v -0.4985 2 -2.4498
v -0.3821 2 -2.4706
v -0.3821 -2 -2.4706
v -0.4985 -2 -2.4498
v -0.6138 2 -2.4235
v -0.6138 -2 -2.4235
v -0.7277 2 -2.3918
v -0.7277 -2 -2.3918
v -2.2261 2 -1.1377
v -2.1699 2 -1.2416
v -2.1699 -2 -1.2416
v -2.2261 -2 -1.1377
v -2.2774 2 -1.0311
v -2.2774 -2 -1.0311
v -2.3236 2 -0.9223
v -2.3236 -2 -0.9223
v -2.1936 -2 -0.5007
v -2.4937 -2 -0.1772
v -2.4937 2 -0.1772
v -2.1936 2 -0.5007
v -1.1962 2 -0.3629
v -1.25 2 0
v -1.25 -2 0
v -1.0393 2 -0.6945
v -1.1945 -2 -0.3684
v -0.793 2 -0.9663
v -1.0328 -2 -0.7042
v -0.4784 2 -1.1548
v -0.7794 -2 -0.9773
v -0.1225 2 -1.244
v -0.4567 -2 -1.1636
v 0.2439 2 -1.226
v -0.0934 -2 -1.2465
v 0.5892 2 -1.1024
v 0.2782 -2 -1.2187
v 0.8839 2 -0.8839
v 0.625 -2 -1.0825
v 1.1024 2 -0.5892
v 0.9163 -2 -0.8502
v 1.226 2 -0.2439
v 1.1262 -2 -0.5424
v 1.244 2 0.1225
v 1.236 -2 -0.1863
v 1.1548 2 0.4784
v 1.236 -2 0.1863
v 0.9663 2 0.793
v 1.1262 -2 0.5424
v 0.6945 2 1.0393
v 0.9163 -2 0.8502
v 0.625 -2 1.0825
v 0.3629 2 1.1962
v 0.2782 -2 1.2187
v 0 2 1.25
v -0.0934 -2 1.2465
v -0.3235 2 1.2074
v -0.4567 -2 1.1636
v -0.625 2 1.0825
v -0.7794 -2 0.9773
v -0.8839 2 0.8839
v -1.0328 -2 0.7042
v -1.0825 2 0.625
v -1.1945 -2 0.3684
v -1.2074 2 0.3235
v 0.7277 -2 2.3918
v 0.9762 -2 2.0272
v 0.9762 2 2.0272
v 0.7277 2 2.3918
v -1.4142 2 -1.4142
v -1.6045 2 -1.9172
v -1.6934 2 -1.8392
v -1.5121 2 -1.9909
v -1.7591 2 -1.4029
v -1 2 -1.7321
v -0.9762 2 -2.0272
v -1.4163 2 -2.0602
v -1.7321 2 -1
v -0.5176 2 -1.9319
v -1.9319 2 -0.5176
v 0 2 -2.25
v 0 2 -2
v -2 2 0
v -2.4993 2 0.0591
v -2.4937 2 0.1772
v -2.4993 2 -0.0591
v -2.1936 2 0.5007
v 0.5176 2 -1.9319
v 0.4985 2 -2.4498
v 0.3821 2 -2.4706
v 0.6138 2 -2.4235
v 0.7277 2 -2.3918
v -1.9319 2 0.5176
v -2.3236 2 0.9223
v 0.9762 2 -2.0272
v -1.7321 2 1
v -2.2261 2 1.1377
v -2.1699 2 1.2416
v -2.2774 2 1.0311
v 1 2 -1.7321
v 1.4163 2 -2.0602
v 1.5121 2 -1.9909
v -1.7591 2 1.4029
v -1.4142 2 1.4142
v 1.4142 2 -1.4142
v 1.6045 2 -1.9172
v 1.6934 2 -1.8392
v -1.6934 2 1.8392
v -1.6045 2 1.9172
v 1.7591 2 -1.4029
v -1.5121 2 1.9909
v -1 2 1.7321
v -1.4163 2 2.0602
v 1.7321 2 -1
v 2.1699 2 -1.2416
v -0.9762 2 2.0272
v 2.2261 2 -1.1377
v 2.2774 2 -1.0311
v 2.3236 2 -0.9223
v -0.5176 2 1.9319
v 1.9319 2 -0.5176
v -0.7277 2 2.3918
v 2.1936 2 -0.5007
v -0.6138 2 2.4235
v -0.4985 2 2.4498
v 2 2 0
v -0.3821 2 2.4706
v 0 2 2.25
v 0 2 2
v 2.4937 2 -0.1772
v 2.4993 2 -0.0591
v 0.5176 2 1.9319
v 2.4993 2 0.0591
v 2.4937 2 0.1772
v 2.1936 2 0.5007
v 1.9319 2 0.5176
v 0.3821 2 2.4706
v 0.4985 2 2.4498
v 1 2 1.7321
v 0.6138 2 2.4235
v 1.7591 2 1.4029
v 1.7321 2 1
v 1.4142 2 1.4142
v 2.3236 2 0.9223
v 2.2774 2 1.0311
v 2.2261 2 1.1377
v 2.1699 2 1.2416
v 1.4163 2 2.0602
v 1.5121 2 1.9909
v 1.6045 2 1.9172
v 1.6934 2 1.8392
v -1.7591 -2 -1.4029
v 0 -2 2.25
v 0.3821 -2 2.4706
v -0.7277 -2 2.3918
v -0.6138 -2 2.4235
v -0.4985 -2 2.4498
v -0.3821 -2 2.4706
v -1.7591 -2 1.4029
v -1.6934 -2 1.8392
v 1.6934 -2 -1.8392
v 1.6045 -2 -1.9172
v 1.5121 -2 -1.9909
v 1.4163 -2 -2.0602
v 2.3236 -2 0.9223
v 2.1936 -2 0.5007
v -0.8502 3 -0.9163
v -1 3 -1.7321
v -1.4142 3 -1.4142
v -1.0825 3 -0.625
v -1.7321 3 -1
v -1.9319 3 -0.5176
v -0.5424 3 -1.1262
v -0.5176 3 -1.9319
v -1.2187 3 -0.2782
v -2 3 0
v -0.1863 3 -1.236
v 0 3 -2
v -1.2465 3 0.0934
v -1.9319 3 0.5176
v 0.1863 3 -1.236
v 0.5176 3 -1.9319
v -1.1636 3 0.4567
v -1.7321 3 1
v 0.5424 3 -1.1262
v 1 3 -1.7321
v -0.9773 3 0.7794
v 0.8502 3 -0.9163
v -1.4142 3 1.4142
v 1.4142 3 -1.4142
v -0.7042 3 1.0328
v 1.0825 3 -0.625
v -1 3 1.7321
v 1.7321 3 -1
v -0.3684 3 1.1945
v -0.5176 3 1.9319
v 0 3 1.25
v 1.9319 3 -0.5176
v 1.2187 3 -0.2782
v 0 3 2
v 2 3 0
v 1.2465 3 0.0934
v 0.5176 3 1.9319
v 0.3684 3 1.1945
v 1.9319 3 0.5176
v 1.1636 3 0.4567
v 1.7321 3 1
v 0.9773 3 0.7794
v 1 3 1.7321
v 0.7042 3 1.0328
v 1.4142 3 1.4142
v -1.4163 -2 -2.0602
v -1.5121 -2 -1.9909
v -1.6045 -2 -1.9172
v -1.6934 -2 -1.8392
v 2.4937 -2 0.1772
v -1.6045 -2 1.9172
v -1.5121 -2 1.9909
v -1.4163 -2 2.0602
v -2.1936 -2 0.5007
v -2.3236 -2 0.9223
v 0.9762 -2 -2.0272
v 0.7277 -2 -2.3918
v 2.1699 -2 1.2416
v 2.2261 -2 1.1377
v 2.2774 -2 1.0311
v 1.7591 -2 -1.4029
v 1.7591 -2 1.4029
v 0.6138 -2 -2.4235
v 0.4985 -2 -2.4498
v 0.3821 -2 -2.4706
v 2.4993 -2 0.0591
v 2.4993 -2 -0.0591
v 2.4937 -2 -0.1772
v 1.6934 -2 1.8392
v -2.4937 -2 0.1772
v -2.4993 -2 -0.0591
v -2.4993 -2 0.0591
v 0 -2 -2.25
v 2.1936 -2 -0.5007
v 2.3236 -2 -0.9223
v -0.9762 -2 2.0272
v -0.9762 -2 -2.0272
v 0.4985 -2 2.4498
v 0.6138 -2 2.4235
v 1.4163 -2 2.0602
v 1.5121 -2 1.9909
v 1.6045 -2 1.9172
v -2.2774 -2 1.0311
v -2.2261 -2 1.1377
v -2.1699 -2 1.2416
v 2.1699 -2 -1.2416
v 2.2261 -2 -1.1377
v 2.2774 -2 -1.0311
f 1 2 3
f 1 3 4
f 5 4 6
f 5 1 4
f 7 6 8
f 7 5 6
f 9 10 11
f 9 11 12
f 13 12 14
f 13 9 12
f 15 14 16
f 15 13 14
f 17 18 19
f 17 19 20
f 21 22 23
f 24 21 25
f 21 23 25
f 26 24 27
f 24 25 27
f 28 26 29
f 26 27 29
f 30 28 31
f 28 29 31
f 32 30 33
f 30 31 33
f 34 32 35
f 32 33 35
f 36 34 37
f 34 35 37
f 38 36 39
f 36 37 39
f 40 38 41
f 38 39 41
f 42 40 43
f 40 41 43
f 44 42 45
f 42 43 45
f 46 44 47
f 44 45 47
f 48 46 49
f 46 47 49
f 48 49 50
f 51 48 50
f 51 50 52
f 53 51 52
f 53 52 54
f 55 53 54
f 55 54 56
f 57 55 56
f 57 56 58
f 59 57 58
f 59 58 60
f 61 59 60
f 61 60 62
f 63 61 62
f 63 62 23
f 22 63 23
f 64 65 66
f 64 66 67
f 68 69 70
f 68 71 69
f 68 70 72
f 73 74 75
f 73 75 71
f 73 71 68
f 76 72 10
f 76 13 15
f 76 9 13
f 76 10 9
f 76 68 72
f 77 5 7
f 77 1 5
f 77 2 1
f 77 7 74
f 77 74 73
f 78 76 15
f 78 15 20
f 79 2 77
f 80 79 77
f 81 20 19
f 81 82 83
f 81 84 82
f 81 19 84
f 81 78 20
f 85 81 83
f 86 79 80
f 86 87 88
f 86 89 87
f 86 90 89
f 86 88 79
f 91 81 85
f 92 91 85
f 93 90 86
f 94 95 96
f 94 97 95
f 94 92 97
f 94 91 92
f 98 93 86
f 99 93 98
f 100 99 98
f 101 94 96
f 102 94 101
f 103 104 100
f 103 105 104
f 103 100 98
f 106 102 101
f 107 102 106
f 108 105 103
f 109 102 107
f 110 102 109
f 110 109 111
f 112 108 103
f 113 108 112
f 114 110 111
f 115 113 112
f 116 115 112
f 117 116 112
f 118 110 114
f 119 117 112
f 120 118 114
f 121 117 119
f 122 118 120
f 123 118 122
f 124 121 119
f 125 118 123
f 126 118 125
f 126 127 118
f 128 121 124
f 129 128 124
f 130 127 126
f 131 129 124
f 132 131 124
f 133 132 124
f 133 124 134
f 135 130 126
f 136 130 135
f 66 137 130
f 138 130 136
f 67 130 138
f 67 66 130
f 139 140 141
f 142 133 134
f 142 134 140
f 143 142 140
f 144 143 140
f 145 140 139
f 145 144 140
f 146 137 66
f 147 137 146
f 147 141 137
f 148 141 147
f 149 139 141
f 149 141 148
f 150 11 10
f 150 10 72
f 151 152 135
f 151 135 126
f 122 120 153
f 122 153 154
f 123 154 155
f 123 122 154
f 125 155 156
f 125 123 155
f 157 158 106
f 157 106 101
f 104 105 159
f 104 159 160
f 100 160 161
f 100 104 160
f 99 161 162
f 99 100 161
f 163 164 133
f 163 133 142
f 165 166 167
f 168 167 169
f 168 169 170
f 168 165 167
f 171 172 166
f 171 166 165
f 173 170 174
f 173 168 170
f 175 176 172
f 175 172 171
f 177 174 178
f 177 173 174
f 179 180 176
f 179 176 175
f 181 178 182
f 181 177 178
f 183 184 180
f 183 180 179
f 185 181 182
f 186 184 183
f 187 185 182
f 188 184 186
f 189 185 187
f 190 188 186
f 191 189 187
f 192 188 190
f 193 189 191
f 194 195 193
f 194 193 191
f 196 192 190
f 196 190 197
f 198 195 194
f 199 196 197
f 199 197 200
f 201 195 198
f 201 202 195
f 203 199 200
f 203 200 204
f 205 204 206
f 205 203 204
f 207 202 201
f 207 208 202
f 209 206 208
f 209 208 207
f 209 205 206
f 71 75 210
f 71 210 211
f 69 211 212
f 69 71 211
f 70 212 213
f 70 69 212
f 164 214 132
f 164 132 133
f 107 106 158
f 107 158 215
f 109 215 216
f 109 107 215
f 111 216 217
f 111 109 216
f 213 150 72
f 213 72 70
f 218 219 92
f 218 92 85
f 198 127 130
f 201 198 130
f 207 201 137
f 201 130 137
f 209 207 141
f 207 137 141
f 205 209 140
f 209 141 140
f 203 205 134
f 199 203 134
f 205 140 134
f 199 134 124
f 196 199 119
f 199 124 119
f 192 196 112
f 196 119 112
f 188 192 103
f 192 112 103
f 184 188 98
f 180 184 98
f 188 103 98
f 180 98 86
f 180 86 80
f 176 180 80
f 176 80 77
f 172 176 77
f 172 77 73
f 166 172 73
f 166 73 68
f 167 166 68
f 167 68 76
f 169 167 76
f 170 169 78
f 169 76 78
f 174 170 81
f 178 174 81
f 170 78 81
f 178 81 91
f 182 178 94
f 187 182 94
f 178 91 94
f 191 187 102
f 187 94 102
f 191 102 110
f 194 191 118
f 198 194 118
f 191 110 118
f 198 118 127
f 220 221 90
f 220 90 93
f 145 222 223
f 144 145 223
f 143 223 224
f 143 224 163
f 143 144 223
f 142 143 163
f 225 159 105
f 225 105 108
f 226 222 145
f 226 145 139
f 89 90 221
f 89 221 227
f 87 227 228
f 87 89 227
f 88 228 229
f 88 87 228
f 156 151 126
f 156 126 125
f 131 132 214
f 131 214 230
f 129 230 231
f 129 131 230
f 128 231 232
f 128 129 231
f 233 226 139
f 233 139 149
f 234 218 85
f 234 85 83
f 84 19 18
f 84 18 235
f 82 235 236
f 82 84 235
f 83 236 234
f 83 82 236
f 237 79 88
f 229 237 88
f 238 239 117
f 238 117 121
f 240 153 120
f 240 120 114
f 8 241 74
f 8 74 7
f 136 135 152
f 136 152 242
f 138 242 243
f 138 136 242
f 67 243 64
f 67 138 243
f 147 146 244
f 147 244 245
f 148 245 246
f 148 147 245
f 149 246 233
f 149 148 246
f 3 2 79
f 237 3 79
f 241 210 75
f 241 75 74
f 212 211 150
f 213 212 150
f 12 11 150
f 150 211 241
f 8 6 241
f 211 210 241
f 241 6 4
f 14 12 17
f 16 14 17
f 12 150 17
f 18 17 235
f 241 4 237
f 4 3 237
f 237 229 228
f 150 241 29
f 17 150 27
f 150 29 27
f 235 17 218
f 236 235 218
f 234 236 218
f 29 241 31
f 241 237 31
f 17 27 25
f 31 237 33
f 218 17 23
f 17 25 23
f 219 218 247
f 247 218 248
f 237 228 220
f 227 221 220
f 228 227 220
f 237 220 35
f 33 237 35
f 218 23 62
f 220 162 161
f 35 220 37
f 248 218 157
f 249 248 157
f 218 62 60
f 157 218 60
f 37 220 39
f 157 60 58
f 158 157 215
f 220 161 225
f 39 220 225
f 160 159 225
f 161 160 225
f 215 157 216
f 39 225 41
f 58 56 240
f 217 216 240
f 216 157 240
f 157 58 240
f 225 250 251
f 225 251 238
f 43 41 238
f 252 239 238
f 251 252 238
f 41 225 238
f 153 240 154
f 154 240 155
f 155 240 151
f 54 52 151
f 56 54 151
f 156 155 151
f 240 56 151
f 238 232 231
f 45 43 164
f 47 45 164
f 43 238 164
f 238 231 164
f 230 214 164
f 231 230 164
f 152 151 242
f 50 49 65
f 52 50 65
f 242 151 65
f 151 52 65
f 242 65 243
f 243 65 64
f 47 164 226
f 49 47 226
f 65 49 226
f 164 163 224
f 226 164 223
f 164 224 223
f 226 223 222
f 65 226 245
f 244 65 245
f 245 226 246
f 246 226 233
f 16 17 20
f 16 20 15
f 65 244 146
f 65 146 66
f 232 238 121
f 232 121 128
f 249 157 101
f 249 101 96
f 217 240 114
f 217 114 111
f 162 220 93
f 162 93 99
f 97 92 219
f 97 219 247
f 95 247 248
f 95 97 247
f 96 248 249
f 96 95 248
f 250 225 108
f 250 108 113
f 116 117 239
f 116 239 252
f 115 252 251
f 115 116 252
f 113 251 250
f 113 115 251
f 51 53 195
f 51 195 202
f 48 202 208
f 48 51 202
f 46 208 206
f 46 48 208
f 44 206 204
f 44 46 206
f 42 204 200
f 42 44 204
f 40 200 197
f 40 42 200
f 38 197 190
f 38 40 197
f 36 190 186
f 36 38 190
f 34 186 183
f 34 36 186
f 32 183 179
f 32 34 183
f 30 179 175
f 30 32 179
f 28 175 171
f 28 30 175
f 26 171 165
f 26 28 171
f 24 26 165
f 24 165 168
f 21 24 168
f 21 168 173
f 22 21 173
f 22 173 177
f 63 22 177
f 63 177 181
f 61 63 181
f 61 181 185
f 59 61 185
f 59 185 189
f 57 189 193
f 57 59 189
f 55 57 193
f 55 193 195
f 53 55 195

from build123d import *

# Parameters (mm, degrees)
MAINBODYS_R           = 2.5
MAIN_BODY_DEPTH       = 2
M3X0_5_TAPPED_HOLE1_D = 2.5
GROOVED_CUT_DEPTH     = 6.338539126
GC_START              = -2
GC_CP_DEPTH           = 4
PRESSFITBODYS_R       = 2
PRESSFITBODYS_R_2     = 1.25
PRESS_FIT_BODY_DEPTH  = 1


# Read off the part's stored shape, not the designer's step: GC CP
with BuildPart() as part:
    # MainBodyS → MAIN BODY (new, symmetric)
    with BuildSketch(Plane(origin=(0, 0, 0), x_dir=(1, 0, 0), z_dir=(0, 1, 0))):
        with Locations(Location((0, 0, 0), (0, 0, 270))):
            Circle(MAINBODYS_R)
    extrude(amount=MAIN_BODY_DEPTH, both=True)

    # M3x0.5 Tapped Hole1 (through all)
    with Locations(Plane(origin=(0, 2, 0), x_dir=(1, 0, 0), z_dir=(0, 1, 0))):
        with Locations((0, 0)):
            Hole(M3X0_5_TAPPED_HOLE1_D / 2)

    # GroovedCutS → GROOVED CUT (cut, through all)
    with BuildSketch(Plane(origin=(0, 2, 0), x_dir=(1, 0, 0), z_dir=(0, 1, 0))):
        with BuildLine():
            Line((0, 2.25), (0.382129822, 2.470622755))
            ThreePointArc((0.382129822, 2.470622755), (0, 2.5), (-0.382129822, 2.470622755))
            Line((-0.382129822, 2.470622755), (0, 2.25))
        make_face()
    extrude(amount=-GROOVED_CUT_DEPTH, mode=Mode.SUBTRACT)

    # GC CP outline → GC CP (cut)
    with BuildSketch(Plane(origin=(0, 0, 0), x_dir=(1, 0, 0), z_dir=(0, 1, 0)).offset(GC_START)):
        with BuildLine():
            ThreePointArc((-0.727675966, 2.391754103), (-1.084709348, 2.25242217), (-1.416250112, 2.060154271))
            Line((-1.416250112, 2.060154271), (-0.976238413, 2.027179953))
            Line((-0.976238413, 2.027179953), (-0.727675966, 2.391754103))
        make_face()
        with BuildLine():
            Line((0.976238413, 2.027179953), (1.416250112, 2.060154271))
            ThreePointArc((1.416250112, 2.060154271), (1.084709348, 2.25242217), (0.727675966, 2.391754103))
            Line((0.727675966, 2.391754103), (0.976238413, 2.027179953))
        make_face()
        with BuildLine():
            Line((1.759120836, 1.402852054), (2.169864698, 1.241646967))
            ThreePointArc((2.169864698, 1.241646967), (1.954578706, 1.558724504), (1.693356605, 1.839169217))
            Line((1.693356605, 1.839169217), (1.759120836, 1.402852054))
        make_face()
        with BuildLine():
            Line((2.193587802, 0.500672101), (2.493710969, 0.177216254))
            ThreePointArc((2.493710969, 0.177216254), (2.43731978, 0.556302335), (2.3236472, 0.922314312))
            Line((2.3236472, 0.922314312), (2.193587802, 0.500672101))
        make_face()
        with BuildLine():
            Line((2.193587802, -0.500672101), (2.3236472, -0.922314312))
            ThreePointArc((2.3236472, -0.922314312), (2.43731978, -0.556302335), (2.493710969, -0.177216254))
            Line((2.493710969, -0.177216254), (2.193587802, -0.500672101))
        make_face()
        with BuildLine():
            Line((1.759120836, -1.402852054), (1.693356605, -1.839169217))
            ThreePointArc((1.693356605, -1.839169217), (1.954578706, -1.558724504), (2.169864698, -1.241646967))
            Line((2.169864698, -1.241646967), (1.759120836, -1.402852054))
        make_face()
        with BuildLine():
            Line((0.976238413, -2.027179953), (0.727675966, -2.391754103))
            ThreePointArc((0.727675966, -2.391754103), (1.084709348, -2.25242217), (1.416250112, -2.060154271))
            Line((1.416250112, -2.060154271), (0.976238413, -2.027179953))
        make_face()
        with BuildLine():
            Line((0, -2.25), (-0.382129822, -2.470622755))
            ThreePointArc((-0.382129822, -2.470622755), (0, -2.5), (0.382129822, -2.470622755))
            Line((0.382129822, -2.470622755), (0, -2.25))
        make_face()
        with BuildLine():
            Line((-0.976238413, -2.027179953), (-1.416250112, -2.060154271))
            ThreePointArc((-1.416250112, -2.060154271), (-1.084709348, -2.25242217), (-0.727675966, -2.391754103))
            Line((-0.727675966, -2.391754103), (-0.976238413, -2.027179953))
        make_face()
        with BuildLine():
            Line((-1.759120836, -1.402852054), (-2.169864698, -1.241646967))
            ThreePointArc((-2.169864698, -1.241646967), (-1.954578706, -1.558724504), (-1.693356605, -1.839169217))
            Line((-1.693356605, -1.839169217), (-1.759120836, -1.402852054))
        make_face()
        with BuildLine():
            Line((-2.193587802, -0.500672101), (-2.493710969, -0.177216254))
            ThreePointArc((-2.493710969, -0.177216254), (-2.43731978, -0.556302335), (-2.3236472, -0.922314312))
            Line((-2.3236472, -0.922314312), (-2.193587802, -0.500672101))
        make_face()
        with BuildLine():
            Line((-2.193587802, 0.500672101), (-2.3236472, 0.922314312))
            ThreePointArc((-2.3236472, 0.922314312), (-2.43731978, 0.556302335), (-2.493710969, 0.177216254))
            Line((-2.493710969, 0.177216254), (-2.193587802, 0.500672101))
        make_face()
        with BuildLine():
            Line((-1.759120836, 1.402852054), (-1.693356605, 1.839169217))
            ThreePointArc((-1.693356605, 1.839169217), (-1.954578706, 1.558724504), (-2.169864698, 1.241646967))
            Line((-2.169864698, 1.241646967), (-1.759120836, 1.402852054))
        make_face()
    extrude(amount=GC_CP_DEPTH, mode=Mode.SUBTRACT)

    # PressFitBodyS → PRESS FIT BODY (add)
    with BuildSketch(Plane(origin=(0, 2, 0), x_dir=(1, 0, 0), z_dir=(0, 1, 0))):
        with Locations(Location((0, 0, 0), (0, 0, 270))):
            Circle(PRESSFITBODYS_R)
        with Locations(Location((0, 0, 0), (0, 0, 270))):
            Circle(PRESSFITBODYS_R_2, mode=Mode.SUBTRACT)
    extrude(amount=PRESS_FIT_BODY_DEPTH)


solid = part.part
